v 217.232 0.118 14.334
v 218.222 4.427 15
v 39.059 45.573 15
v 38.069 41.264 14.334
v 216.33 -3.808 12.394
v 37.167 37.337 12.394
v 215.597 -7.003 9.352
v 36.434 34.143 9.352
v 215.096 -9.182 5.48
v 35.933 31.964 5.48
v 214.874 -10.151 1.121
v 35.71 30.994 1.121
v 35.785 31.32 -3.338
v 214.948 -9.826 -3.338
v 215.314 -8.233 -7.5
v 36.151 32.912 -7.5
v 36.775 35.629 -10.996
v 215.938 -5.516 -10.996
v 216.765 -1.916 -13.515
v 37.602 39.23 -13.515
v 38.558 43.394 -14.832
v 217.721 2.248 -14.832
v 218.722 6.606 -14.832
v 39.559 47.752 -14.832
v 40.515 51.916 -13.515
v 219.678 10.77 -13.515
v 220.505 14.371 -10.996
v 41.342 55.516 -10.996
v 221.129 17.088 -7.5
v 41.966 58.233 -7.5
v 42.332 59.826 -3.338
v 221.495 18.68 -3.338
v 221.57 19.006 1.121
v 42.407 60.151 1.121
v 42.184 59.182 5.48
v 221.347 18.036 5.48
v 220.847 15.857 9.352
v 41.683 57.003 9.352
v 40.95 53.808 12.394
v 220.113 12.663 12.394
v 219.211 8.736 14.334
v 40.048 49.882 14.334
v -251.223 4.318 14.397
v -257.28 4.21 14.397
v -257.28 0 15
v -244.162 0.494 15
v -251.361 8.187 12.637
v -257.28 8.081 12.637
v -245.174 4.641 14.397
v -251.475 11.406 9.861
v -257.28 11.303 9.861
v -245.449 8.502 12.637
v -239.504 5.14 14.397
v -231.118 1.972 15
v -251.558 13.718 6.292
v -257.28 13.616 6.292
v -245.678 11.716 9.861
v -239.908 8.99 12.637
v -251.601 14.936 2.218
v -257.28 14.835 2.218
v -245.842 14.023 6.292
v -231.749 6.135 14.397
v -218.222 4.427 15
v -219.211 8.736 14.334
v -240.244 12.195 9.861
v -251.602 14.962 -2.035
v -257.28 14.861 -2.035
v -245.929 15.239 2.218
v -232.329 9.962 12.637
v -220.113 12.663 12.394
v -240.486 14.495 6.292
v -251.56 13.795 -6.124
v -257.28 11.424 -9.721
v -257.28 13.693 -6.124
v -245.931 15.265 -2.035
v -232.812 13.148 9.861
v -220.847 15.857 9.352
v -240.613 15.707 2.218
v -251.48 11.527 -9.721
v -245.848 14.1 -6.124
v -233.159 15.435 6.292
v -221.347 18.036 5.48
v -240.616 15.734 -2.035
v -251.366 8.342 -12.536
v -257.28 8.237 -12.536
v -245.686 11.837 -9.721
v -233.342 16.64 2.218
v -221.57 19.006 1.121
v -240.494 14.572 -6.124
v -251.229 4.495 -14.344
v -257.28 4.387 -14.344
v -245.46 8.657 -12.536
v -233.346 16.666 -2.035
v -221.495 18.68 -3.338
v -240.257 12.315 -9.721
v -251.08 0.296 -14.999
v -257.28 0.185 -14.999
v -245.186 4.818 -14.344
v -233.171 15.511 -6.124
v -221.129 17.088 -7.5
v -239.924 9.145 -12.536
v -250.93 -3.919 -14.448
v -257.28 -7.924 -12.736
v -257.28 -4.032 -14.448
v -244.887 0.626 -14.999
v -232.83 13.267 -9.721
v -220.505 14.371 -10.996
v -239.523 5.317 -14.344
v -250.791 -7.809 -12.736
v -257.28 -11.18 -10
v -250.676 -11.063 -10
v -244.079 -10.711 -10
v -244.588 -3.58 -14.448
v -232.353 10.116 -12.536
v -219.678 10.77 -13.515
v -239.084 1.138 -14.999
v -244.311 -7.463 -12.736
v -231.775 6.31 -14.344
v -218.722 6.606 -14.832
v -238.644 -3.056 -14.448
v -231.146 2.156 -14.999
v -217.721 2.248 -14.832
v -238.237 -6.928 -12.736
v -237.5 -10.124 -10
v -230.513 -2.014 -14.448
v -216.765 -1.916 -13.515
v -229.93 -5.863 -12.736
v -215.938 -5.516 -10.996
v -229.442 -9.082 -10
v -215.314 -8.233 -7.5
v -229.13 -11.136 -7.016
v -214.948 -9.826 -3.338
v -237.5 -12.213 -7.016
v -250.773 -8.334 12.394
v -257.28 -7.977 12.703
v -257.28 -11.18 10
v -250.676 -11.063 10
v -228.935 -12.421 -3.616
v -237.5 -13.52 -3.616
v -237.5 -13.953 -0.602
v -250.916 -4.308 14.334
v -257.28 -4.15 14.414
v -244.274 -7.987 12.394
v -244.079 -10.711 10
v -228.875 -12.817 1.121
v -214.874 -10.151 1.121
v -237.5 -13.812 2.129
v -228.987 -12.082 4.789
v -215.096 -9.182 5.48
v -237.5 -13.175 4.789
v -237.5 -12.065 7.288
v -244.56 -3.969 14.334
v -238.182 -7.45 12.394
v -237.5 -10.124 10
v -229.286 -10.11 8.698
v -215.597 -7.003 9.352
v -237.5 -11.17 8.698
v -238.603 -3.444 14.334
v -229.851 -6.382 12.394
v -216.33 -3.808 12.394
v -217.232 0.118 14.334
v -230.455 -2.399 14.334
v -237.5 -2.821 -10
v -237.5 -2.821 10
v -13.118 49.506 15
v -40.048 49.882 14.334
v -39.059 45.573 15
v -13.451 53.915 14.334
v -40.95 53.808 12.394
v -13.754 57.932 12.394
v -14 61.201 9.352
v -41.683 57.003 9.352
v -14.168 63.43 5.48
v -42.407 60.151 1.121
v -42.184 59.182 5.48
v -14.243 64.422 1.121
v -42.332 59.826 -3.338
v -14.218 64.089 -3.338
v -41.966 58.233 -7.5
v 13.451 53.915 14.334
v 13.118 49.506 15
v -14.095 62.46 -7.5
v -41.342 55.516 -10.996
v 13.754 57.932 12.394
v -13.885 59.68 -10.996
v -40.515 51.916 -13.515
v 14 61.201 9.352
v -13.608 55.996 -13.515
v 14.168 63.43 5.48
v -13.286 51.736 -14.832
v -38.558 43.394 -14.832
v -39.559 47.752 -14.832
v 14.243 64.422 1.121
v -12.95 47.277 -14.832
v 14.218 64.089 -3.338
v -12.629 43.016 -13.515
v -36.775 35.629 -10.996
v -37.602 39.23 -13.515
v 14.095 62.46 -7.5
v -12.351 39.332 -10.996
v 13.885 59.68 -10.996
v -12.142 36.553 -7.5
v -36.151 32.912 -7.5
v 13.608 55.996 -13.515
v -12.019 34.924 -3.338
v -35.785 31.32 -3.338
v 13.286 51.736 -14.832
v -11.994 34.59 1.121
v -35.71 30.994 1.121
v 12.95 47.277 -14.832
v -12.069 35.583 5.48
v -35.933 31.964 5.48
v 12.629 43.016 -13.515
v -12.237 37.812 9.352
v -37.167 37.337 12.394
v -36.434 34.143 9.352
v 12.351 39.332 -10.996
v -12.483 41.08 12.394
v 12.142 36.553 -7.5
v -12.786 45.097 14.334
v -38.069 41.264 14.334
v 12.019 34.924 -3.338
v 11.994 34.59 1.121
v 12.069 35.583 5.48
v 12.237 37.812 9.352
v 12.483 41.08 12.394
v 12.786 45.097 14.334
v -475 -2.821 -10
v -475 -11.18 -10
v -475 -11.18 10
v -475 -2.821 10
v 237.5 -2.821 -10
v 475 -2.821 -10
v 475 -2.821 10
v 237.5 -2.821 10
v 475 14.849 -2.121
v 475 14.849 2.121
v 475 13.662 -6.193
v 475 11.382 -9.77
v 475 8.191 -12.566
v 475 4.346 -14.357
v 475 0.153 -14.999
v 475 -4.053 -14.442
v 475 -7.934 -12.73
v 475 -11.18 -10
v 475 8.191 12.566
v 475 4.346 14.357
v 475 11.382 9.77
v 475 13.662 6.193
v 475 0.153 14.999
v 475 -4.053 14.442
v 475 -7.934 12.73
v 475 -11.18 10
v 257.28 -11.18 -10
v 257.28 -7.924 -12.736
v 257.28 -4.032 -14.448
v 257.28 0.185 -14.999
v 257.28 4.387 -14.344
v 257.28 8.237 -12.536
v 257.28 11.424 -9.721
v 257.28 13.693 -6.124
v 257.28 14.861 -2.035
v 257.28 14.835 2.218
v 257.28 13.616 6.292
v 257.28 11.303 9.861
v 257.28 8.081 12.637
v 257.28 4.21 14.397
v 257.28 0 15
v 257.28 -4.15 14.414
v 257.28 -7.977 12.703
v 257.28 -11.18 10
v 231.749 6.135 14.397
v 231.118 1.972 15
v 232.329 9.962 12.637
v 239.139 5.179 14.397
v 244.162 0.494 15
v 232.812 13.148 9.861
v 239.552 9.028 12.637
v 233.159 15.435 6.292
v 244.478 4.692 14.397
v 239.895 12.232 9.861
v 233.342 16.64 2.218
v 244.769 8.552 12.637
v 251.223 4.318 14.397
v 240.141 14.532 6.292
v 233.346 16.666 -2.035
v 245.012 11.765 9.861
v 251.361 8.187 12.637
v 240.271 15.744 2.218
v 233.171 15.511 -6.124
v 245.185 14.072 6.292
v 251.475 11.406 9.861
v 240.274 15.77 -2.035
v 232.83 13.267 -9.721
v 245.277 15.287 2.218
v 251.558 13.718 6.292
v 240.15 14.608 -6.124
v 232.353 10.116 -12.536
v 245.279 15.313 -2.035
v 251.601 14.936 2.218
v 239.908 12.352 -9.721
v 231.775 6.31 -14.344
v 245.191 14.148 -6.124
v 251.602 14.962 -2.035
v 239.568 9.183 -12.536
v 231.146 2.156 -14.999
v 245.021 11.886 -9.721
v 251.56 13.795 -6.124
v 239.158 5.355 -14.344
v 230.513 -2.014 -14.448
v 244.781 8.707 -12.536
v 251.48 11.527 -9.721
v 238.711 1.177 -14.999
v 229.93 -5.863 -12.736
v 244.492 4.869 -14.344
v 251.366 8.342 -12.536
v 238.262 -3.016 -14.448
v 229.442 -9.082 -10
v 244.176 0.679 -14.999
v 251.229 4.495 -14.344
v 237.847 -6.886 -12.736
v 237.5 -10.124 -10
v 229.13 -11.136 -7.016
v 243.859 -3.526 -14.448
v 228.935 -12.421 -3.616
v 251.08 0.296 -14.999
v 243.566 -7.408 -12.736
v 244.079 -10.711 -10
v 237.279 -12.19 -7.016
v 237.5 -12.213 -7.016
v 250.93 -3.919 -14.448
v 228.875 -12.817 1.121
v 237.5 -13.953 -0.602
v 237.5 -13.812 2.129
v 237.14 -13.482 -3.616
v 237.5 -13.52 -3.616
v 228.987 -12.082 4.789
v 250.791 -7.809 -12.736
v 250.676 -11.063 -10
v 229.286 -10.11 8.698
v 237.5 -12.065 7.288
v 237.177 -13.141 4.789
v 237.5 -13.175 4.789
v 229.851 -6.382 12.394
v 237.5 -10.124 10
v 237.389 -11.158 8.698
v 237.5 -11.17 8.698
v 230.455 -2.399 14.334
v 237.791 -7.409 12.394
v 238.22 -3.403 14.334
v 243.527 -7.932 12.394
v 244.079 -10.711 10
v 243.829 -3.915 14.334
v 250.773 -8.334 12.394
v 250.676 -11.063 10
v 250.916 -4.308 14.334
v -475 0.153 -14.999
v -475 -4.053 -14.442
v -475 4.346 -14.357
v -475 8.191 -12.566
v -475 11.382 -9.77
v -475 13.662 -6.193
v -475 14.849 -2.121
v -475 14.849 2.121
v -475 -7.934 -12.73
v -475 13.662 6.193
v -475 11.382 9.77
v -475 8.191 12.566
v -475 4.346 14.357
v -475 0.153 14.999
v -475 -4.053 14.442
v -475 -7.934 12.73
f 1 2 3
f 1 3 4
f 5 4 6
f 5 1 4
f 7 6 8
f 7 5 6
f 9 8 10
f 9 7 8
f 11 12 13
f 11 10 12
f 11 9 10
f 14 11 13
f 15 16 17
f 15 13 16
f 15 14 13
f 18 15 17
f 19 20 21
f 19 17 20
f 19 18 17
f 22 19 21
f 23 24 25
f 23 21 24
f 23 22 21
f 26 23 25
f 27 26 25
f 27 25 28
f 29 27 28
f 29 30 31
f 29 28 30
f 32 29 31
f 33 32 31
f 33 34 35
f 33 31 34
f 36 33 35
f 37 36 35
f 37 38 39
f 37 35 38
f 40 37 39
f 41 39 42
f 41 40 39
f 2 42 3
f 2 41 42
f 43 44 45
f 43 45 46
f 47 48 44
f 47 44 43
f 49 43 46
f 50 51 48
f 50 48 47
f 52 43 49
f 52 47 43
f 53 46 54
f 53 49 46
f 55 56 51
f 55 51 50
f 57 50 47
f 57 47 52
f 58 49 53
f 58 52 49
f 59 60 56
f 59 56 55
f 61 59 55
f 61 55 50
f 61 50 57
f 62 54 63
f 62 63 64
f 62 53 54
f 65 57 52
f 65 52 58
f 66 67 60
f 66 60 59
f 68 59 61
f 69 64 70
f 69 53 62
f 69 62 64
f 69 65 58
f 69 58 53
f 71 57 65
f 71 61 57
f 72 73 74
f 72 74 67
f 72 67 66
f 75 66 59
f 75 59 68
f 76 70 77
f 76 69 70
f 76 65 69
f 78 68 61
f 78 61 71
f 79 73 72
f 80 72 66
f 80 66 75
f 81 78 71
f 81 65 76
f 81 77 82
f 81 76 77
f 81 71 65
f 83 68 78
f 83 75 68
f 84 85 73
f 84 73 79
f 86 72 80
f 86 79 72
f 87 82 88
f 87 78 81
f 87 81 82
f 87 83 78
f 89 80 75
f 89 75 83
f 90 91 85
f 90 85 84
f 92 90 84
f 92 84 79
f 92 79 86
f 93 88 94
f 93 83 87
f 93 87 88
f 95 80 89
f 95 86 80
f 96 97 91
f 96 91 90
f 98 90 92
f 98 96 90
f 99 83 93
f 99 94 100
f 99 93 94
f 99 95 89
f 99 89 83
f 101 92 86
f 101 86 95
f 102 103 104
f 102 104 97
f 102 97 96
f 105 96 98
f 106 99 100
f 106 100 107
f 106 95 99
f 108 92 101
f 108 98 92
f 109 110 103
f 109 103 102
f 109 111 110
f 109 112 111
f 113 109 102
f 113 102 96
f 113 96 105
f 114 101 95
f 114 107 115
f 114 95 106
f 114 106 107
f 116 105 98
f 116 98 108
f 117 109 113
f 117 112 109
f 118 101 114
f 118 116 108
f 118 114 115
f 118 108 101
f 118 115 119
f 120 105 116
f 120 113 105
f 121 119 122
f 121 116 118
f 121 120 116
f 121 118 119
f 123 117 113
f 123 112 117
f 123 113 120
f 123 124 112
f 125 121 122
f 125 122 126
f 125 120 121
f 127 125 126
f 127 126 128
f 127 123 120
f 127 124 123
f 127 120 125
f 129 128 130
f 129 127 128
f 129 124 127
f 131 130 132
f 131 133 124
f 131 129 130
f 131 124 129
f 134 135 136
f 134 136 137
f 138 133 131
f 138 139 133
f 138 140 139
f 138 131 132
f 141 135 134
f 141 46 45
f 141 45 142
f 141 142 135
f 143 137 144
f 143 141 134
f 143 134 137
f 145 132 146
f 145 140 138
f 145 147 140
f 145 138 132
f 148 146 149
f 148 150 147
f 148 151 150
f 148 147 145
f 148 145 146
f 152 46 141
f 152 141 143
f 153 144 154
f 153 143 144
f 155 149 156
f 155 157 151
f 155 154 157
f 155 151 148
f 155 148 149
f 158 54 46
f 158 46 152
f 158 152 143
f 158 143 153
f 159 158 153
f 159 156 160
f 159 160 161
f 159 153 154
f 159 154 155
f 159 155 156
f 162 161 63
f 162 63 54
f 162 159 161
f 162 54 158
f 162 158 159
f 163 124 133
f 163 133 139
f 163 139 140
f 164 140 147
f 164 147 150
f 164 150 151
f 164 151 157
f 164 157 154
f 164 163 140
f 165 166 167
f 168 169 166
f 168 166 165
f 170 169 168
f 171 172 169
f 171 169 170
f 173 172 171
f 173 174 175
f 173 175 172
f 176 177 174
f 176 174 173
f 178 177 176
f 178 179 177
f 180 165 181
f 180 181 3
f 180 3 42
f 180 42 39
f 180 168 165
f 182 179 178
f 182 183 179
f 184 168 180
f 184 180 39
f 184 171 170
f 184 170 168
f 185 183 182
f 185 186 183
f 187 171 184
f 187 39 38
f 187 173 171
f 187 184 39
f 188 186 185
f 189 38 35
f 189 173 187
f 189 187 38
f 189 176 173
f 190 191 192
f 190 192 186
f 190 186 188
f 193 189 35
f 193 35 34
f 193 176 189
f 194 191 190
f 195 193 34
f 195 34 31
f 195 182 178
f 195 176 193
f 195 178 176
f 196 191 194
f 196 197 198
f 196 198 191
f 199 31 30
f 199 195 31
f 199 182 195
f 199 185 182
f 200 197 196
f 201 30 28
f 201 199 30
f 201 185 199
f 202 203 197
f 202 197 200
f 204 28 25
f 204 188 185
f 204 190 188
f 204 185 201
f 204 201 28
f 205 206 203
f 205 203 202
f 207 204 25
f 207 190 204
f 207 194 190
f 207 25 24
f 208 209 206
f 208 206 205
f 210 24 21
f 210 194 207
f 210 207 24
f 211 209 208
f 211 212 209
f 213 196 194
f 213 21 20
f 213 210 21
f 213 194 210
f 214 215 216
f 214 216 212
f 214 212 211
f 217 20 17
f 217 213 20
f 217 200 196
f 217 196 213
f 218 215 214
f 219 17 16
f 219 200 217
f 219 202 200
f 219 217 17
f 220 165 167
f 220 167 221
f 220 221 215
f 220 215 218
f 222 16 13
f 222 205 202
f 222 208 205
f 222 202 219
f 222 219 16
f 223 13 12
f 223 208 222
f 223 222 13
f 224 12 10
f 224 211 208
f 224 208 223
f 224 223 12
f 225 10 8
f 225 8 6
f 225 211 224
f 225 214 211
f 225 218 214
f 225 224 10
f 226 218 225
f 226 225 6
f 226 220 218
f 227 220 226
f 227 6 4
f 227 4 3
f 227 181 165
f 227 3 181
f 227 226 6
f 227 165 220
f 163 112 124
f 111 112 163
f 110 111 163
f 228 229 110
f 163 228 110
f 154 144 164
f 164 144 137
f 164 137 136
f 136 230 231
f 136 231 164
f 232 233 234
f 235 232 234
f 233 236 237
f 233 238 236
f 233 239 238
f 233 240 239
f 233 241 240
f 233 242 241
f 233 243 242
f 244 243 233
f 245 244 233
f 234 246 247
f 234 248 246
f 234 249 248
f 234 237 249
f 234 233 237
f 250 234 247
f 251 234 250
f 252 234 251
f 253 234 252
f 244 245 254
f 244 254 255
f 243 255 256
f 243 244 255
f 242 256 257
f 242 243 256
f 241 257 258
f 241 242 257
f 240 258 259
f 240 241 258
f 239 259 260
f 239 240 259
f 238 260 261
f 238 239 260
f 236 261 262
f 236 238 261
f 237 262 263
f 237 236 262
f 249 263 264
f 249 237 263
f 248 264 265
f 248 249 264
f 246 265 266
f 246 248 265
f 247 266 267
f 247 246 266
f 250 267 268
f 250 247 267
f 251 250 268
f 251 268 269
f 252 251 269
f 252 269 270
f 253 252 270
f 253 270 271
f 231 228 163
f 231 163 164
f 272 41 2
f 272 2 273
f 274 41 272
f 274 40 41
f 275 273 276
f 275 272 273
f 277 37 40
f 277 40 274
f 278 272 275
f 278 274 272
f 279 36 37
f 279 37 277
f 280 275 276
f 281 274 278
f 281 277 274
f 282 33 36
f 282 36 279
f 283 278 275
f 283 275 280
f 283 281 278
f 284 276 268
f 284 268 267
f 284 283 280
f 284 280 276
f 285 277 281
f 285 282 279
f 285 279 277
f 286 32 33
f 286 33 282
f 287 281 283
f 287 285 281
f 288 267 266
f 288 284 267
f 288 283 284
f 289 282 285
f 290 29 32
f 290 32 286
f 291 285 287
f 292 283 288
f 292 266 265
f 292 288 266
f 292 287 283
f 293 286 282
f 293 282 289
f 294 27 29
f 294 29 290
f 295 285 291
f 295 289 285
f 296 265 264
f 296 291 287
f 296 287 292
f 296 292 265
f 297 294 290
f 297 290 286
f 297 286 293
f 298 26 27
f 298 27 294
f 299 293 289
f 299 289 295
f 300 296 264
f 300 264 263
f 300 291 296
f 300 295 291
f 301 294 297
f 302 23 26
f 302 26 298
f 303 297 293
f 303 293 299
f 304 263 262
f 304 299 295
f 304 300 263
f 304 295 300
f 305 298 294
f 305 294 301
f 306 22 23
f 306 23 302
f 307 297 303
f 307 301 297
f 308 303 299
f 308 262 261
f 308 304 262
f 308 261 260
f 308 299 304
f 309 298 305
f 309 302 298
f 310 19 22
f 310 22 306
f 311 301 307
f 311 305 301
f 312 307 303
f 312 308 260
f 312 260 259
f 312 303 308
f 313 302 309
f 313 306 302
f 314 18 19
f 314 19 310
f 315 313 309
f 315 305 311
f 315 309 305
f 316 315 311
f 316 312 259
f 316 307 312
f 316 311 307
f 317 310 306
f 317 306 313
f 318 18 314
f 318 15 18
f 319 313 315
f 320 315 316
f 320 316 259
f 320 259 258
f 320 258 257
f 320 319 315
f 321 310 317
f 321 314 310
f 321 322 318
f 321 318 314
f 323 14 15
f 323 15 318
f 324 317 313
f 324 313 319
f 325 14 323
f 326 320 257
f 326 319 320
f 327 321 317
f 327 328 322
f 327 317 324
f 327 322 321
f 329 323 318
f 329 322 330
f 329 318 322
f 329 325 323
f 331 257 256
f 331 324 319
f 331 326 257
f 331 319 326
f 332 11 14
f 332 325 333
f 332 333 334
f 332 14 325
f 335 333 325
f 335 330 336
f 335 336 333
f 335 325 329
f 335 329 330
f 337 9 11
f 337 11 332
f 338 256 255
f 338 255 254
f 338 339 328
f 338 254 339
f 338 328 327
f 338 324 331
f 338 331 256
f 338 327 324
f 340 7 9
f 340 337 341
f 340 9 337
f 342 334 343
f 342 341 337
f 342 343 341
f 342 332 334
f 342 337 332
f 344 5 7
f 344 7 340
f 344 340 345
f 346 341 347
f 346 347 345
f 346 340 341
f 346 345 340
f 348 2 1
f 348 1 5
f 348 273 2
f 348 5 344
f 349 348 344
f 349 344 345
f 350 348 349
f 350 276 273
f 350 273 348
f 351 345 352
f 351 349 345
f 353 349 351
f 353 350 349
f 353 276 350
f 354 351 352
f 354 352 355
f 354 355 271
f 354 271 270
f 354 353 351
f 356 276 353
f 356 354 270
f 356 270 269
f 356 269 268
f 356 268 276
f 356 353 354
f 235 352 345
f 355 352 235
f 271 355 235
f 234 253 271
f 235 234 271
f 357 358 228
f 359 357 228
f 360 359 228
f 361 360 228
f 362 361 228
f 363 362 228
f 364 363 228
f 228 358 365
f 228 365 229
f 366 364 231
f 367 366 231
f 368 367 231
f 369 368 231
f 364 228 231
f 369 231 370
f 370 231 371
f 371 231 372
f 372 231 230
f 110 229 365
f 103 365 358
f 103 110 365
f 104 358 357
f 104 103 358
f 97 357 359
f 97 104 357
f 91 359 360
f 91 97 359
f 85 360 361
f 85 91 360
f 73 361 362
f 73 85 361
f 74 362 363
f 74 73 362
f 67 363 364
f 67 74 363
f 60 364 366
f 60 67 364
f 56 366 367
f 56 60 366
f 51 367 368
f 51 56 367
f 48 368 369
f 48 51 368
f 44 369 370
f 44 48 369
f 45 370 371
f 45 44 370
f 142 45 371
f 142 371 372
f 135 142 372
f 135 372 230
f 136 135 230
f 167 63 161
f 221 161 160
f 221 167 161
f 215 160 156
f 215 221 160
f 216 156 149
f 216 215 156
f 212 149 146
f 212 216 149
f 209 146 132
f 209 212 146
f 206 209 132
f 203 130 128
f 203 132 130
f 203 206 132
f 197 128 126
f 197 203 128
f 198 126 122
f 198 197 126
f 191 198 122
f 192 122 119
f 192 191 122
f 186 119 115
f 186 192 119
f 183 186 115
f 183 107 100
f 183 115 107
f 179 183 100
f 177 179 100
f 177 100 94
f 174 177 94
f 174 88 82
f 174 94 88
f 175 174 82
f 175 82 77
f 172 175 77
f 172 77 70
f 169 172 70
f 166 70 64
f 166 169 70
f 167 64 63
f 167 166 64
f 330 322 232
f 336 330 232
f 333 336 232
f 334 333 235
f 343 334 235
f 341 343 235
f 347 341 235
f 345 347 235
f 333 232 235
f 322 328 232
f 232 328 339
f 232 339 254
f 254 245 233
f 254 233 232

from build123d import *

# Parameters (mm, degrees)
SWEEP1_PROFILE_R   = 15
SKETCH26_W         = 20
SKETCH26_H         = 24.358108154
CUT_EXTRUDE2_DEPTH = 237.5
CUT_EXTRUDE3_START = -950
SKETCH26_2_W       = 20
SKETCH26_2_H       = 24.358108154
CUT_EXTRUDE3_DEPTH = 237.5


with BuildPart() as part:
    # Sweep1: sweep along a path in Sketch1
    with BuildLine(Plane.XY) as sweep1_path:
        Line((-475, 0), (-257.280174441, 0))
        ThreePointArc((-257.280174441, 0), (-237.625861021, 1.110364069), (-218.221667938, 4.42732581))
        Line((-218.221667938, 4.42732581), (-39.058506504, 45.57267419))
        ThreePointArc((-39.058506504, 45.57267419), (0, 50), (39.058506504, 45.57267419))
        Line((39.058506504, 45.57267419), (218.221667938, 4.42732581))
        ThreePointArc((218.221667938, 4.42732581), (237.625861021, 1.110364069), (257.280174441, 0))
        Line((257.280174441, 0), (475, 0))
    # Sweep1 profile (on start of the path) → Sweep1 (sweep)
    with BuildSketch(Plane(origin=(-475, 0, 0), x_dir=(0, 0, 1), z_dir=(1, 0, 0))):
        Circle(SWEEP1_PROFILE_R)
    sweep(path=sweep1_path.line)

    # Sketch26 → Cut-Extrude2 (cut)
    with BuildSketch(Plane.ZY.offset(475)):
        with Locations((0, -15)):
            Rectangle(SKETCH26_W, SKETCH26_H)
    extrude(amount=-CUT_EXTRUDE2_DEPTH, mode=Mode.SUBTRACT)

    # Sketch26<2> → Cut-Extrude3 (cut)
    with BuildSketch(Plane.ZY.offset(475).offset(CUT_EXTRUDE3_START)):
        with Locations((0, -15)):
            Rectangle(SKETCH26_2_W, SKETCH26_2_H)
    extrude(amount=CUT_EXTRUDE3_DEPTH, mode=Mode.SUBTRACT)


solid = part.part
